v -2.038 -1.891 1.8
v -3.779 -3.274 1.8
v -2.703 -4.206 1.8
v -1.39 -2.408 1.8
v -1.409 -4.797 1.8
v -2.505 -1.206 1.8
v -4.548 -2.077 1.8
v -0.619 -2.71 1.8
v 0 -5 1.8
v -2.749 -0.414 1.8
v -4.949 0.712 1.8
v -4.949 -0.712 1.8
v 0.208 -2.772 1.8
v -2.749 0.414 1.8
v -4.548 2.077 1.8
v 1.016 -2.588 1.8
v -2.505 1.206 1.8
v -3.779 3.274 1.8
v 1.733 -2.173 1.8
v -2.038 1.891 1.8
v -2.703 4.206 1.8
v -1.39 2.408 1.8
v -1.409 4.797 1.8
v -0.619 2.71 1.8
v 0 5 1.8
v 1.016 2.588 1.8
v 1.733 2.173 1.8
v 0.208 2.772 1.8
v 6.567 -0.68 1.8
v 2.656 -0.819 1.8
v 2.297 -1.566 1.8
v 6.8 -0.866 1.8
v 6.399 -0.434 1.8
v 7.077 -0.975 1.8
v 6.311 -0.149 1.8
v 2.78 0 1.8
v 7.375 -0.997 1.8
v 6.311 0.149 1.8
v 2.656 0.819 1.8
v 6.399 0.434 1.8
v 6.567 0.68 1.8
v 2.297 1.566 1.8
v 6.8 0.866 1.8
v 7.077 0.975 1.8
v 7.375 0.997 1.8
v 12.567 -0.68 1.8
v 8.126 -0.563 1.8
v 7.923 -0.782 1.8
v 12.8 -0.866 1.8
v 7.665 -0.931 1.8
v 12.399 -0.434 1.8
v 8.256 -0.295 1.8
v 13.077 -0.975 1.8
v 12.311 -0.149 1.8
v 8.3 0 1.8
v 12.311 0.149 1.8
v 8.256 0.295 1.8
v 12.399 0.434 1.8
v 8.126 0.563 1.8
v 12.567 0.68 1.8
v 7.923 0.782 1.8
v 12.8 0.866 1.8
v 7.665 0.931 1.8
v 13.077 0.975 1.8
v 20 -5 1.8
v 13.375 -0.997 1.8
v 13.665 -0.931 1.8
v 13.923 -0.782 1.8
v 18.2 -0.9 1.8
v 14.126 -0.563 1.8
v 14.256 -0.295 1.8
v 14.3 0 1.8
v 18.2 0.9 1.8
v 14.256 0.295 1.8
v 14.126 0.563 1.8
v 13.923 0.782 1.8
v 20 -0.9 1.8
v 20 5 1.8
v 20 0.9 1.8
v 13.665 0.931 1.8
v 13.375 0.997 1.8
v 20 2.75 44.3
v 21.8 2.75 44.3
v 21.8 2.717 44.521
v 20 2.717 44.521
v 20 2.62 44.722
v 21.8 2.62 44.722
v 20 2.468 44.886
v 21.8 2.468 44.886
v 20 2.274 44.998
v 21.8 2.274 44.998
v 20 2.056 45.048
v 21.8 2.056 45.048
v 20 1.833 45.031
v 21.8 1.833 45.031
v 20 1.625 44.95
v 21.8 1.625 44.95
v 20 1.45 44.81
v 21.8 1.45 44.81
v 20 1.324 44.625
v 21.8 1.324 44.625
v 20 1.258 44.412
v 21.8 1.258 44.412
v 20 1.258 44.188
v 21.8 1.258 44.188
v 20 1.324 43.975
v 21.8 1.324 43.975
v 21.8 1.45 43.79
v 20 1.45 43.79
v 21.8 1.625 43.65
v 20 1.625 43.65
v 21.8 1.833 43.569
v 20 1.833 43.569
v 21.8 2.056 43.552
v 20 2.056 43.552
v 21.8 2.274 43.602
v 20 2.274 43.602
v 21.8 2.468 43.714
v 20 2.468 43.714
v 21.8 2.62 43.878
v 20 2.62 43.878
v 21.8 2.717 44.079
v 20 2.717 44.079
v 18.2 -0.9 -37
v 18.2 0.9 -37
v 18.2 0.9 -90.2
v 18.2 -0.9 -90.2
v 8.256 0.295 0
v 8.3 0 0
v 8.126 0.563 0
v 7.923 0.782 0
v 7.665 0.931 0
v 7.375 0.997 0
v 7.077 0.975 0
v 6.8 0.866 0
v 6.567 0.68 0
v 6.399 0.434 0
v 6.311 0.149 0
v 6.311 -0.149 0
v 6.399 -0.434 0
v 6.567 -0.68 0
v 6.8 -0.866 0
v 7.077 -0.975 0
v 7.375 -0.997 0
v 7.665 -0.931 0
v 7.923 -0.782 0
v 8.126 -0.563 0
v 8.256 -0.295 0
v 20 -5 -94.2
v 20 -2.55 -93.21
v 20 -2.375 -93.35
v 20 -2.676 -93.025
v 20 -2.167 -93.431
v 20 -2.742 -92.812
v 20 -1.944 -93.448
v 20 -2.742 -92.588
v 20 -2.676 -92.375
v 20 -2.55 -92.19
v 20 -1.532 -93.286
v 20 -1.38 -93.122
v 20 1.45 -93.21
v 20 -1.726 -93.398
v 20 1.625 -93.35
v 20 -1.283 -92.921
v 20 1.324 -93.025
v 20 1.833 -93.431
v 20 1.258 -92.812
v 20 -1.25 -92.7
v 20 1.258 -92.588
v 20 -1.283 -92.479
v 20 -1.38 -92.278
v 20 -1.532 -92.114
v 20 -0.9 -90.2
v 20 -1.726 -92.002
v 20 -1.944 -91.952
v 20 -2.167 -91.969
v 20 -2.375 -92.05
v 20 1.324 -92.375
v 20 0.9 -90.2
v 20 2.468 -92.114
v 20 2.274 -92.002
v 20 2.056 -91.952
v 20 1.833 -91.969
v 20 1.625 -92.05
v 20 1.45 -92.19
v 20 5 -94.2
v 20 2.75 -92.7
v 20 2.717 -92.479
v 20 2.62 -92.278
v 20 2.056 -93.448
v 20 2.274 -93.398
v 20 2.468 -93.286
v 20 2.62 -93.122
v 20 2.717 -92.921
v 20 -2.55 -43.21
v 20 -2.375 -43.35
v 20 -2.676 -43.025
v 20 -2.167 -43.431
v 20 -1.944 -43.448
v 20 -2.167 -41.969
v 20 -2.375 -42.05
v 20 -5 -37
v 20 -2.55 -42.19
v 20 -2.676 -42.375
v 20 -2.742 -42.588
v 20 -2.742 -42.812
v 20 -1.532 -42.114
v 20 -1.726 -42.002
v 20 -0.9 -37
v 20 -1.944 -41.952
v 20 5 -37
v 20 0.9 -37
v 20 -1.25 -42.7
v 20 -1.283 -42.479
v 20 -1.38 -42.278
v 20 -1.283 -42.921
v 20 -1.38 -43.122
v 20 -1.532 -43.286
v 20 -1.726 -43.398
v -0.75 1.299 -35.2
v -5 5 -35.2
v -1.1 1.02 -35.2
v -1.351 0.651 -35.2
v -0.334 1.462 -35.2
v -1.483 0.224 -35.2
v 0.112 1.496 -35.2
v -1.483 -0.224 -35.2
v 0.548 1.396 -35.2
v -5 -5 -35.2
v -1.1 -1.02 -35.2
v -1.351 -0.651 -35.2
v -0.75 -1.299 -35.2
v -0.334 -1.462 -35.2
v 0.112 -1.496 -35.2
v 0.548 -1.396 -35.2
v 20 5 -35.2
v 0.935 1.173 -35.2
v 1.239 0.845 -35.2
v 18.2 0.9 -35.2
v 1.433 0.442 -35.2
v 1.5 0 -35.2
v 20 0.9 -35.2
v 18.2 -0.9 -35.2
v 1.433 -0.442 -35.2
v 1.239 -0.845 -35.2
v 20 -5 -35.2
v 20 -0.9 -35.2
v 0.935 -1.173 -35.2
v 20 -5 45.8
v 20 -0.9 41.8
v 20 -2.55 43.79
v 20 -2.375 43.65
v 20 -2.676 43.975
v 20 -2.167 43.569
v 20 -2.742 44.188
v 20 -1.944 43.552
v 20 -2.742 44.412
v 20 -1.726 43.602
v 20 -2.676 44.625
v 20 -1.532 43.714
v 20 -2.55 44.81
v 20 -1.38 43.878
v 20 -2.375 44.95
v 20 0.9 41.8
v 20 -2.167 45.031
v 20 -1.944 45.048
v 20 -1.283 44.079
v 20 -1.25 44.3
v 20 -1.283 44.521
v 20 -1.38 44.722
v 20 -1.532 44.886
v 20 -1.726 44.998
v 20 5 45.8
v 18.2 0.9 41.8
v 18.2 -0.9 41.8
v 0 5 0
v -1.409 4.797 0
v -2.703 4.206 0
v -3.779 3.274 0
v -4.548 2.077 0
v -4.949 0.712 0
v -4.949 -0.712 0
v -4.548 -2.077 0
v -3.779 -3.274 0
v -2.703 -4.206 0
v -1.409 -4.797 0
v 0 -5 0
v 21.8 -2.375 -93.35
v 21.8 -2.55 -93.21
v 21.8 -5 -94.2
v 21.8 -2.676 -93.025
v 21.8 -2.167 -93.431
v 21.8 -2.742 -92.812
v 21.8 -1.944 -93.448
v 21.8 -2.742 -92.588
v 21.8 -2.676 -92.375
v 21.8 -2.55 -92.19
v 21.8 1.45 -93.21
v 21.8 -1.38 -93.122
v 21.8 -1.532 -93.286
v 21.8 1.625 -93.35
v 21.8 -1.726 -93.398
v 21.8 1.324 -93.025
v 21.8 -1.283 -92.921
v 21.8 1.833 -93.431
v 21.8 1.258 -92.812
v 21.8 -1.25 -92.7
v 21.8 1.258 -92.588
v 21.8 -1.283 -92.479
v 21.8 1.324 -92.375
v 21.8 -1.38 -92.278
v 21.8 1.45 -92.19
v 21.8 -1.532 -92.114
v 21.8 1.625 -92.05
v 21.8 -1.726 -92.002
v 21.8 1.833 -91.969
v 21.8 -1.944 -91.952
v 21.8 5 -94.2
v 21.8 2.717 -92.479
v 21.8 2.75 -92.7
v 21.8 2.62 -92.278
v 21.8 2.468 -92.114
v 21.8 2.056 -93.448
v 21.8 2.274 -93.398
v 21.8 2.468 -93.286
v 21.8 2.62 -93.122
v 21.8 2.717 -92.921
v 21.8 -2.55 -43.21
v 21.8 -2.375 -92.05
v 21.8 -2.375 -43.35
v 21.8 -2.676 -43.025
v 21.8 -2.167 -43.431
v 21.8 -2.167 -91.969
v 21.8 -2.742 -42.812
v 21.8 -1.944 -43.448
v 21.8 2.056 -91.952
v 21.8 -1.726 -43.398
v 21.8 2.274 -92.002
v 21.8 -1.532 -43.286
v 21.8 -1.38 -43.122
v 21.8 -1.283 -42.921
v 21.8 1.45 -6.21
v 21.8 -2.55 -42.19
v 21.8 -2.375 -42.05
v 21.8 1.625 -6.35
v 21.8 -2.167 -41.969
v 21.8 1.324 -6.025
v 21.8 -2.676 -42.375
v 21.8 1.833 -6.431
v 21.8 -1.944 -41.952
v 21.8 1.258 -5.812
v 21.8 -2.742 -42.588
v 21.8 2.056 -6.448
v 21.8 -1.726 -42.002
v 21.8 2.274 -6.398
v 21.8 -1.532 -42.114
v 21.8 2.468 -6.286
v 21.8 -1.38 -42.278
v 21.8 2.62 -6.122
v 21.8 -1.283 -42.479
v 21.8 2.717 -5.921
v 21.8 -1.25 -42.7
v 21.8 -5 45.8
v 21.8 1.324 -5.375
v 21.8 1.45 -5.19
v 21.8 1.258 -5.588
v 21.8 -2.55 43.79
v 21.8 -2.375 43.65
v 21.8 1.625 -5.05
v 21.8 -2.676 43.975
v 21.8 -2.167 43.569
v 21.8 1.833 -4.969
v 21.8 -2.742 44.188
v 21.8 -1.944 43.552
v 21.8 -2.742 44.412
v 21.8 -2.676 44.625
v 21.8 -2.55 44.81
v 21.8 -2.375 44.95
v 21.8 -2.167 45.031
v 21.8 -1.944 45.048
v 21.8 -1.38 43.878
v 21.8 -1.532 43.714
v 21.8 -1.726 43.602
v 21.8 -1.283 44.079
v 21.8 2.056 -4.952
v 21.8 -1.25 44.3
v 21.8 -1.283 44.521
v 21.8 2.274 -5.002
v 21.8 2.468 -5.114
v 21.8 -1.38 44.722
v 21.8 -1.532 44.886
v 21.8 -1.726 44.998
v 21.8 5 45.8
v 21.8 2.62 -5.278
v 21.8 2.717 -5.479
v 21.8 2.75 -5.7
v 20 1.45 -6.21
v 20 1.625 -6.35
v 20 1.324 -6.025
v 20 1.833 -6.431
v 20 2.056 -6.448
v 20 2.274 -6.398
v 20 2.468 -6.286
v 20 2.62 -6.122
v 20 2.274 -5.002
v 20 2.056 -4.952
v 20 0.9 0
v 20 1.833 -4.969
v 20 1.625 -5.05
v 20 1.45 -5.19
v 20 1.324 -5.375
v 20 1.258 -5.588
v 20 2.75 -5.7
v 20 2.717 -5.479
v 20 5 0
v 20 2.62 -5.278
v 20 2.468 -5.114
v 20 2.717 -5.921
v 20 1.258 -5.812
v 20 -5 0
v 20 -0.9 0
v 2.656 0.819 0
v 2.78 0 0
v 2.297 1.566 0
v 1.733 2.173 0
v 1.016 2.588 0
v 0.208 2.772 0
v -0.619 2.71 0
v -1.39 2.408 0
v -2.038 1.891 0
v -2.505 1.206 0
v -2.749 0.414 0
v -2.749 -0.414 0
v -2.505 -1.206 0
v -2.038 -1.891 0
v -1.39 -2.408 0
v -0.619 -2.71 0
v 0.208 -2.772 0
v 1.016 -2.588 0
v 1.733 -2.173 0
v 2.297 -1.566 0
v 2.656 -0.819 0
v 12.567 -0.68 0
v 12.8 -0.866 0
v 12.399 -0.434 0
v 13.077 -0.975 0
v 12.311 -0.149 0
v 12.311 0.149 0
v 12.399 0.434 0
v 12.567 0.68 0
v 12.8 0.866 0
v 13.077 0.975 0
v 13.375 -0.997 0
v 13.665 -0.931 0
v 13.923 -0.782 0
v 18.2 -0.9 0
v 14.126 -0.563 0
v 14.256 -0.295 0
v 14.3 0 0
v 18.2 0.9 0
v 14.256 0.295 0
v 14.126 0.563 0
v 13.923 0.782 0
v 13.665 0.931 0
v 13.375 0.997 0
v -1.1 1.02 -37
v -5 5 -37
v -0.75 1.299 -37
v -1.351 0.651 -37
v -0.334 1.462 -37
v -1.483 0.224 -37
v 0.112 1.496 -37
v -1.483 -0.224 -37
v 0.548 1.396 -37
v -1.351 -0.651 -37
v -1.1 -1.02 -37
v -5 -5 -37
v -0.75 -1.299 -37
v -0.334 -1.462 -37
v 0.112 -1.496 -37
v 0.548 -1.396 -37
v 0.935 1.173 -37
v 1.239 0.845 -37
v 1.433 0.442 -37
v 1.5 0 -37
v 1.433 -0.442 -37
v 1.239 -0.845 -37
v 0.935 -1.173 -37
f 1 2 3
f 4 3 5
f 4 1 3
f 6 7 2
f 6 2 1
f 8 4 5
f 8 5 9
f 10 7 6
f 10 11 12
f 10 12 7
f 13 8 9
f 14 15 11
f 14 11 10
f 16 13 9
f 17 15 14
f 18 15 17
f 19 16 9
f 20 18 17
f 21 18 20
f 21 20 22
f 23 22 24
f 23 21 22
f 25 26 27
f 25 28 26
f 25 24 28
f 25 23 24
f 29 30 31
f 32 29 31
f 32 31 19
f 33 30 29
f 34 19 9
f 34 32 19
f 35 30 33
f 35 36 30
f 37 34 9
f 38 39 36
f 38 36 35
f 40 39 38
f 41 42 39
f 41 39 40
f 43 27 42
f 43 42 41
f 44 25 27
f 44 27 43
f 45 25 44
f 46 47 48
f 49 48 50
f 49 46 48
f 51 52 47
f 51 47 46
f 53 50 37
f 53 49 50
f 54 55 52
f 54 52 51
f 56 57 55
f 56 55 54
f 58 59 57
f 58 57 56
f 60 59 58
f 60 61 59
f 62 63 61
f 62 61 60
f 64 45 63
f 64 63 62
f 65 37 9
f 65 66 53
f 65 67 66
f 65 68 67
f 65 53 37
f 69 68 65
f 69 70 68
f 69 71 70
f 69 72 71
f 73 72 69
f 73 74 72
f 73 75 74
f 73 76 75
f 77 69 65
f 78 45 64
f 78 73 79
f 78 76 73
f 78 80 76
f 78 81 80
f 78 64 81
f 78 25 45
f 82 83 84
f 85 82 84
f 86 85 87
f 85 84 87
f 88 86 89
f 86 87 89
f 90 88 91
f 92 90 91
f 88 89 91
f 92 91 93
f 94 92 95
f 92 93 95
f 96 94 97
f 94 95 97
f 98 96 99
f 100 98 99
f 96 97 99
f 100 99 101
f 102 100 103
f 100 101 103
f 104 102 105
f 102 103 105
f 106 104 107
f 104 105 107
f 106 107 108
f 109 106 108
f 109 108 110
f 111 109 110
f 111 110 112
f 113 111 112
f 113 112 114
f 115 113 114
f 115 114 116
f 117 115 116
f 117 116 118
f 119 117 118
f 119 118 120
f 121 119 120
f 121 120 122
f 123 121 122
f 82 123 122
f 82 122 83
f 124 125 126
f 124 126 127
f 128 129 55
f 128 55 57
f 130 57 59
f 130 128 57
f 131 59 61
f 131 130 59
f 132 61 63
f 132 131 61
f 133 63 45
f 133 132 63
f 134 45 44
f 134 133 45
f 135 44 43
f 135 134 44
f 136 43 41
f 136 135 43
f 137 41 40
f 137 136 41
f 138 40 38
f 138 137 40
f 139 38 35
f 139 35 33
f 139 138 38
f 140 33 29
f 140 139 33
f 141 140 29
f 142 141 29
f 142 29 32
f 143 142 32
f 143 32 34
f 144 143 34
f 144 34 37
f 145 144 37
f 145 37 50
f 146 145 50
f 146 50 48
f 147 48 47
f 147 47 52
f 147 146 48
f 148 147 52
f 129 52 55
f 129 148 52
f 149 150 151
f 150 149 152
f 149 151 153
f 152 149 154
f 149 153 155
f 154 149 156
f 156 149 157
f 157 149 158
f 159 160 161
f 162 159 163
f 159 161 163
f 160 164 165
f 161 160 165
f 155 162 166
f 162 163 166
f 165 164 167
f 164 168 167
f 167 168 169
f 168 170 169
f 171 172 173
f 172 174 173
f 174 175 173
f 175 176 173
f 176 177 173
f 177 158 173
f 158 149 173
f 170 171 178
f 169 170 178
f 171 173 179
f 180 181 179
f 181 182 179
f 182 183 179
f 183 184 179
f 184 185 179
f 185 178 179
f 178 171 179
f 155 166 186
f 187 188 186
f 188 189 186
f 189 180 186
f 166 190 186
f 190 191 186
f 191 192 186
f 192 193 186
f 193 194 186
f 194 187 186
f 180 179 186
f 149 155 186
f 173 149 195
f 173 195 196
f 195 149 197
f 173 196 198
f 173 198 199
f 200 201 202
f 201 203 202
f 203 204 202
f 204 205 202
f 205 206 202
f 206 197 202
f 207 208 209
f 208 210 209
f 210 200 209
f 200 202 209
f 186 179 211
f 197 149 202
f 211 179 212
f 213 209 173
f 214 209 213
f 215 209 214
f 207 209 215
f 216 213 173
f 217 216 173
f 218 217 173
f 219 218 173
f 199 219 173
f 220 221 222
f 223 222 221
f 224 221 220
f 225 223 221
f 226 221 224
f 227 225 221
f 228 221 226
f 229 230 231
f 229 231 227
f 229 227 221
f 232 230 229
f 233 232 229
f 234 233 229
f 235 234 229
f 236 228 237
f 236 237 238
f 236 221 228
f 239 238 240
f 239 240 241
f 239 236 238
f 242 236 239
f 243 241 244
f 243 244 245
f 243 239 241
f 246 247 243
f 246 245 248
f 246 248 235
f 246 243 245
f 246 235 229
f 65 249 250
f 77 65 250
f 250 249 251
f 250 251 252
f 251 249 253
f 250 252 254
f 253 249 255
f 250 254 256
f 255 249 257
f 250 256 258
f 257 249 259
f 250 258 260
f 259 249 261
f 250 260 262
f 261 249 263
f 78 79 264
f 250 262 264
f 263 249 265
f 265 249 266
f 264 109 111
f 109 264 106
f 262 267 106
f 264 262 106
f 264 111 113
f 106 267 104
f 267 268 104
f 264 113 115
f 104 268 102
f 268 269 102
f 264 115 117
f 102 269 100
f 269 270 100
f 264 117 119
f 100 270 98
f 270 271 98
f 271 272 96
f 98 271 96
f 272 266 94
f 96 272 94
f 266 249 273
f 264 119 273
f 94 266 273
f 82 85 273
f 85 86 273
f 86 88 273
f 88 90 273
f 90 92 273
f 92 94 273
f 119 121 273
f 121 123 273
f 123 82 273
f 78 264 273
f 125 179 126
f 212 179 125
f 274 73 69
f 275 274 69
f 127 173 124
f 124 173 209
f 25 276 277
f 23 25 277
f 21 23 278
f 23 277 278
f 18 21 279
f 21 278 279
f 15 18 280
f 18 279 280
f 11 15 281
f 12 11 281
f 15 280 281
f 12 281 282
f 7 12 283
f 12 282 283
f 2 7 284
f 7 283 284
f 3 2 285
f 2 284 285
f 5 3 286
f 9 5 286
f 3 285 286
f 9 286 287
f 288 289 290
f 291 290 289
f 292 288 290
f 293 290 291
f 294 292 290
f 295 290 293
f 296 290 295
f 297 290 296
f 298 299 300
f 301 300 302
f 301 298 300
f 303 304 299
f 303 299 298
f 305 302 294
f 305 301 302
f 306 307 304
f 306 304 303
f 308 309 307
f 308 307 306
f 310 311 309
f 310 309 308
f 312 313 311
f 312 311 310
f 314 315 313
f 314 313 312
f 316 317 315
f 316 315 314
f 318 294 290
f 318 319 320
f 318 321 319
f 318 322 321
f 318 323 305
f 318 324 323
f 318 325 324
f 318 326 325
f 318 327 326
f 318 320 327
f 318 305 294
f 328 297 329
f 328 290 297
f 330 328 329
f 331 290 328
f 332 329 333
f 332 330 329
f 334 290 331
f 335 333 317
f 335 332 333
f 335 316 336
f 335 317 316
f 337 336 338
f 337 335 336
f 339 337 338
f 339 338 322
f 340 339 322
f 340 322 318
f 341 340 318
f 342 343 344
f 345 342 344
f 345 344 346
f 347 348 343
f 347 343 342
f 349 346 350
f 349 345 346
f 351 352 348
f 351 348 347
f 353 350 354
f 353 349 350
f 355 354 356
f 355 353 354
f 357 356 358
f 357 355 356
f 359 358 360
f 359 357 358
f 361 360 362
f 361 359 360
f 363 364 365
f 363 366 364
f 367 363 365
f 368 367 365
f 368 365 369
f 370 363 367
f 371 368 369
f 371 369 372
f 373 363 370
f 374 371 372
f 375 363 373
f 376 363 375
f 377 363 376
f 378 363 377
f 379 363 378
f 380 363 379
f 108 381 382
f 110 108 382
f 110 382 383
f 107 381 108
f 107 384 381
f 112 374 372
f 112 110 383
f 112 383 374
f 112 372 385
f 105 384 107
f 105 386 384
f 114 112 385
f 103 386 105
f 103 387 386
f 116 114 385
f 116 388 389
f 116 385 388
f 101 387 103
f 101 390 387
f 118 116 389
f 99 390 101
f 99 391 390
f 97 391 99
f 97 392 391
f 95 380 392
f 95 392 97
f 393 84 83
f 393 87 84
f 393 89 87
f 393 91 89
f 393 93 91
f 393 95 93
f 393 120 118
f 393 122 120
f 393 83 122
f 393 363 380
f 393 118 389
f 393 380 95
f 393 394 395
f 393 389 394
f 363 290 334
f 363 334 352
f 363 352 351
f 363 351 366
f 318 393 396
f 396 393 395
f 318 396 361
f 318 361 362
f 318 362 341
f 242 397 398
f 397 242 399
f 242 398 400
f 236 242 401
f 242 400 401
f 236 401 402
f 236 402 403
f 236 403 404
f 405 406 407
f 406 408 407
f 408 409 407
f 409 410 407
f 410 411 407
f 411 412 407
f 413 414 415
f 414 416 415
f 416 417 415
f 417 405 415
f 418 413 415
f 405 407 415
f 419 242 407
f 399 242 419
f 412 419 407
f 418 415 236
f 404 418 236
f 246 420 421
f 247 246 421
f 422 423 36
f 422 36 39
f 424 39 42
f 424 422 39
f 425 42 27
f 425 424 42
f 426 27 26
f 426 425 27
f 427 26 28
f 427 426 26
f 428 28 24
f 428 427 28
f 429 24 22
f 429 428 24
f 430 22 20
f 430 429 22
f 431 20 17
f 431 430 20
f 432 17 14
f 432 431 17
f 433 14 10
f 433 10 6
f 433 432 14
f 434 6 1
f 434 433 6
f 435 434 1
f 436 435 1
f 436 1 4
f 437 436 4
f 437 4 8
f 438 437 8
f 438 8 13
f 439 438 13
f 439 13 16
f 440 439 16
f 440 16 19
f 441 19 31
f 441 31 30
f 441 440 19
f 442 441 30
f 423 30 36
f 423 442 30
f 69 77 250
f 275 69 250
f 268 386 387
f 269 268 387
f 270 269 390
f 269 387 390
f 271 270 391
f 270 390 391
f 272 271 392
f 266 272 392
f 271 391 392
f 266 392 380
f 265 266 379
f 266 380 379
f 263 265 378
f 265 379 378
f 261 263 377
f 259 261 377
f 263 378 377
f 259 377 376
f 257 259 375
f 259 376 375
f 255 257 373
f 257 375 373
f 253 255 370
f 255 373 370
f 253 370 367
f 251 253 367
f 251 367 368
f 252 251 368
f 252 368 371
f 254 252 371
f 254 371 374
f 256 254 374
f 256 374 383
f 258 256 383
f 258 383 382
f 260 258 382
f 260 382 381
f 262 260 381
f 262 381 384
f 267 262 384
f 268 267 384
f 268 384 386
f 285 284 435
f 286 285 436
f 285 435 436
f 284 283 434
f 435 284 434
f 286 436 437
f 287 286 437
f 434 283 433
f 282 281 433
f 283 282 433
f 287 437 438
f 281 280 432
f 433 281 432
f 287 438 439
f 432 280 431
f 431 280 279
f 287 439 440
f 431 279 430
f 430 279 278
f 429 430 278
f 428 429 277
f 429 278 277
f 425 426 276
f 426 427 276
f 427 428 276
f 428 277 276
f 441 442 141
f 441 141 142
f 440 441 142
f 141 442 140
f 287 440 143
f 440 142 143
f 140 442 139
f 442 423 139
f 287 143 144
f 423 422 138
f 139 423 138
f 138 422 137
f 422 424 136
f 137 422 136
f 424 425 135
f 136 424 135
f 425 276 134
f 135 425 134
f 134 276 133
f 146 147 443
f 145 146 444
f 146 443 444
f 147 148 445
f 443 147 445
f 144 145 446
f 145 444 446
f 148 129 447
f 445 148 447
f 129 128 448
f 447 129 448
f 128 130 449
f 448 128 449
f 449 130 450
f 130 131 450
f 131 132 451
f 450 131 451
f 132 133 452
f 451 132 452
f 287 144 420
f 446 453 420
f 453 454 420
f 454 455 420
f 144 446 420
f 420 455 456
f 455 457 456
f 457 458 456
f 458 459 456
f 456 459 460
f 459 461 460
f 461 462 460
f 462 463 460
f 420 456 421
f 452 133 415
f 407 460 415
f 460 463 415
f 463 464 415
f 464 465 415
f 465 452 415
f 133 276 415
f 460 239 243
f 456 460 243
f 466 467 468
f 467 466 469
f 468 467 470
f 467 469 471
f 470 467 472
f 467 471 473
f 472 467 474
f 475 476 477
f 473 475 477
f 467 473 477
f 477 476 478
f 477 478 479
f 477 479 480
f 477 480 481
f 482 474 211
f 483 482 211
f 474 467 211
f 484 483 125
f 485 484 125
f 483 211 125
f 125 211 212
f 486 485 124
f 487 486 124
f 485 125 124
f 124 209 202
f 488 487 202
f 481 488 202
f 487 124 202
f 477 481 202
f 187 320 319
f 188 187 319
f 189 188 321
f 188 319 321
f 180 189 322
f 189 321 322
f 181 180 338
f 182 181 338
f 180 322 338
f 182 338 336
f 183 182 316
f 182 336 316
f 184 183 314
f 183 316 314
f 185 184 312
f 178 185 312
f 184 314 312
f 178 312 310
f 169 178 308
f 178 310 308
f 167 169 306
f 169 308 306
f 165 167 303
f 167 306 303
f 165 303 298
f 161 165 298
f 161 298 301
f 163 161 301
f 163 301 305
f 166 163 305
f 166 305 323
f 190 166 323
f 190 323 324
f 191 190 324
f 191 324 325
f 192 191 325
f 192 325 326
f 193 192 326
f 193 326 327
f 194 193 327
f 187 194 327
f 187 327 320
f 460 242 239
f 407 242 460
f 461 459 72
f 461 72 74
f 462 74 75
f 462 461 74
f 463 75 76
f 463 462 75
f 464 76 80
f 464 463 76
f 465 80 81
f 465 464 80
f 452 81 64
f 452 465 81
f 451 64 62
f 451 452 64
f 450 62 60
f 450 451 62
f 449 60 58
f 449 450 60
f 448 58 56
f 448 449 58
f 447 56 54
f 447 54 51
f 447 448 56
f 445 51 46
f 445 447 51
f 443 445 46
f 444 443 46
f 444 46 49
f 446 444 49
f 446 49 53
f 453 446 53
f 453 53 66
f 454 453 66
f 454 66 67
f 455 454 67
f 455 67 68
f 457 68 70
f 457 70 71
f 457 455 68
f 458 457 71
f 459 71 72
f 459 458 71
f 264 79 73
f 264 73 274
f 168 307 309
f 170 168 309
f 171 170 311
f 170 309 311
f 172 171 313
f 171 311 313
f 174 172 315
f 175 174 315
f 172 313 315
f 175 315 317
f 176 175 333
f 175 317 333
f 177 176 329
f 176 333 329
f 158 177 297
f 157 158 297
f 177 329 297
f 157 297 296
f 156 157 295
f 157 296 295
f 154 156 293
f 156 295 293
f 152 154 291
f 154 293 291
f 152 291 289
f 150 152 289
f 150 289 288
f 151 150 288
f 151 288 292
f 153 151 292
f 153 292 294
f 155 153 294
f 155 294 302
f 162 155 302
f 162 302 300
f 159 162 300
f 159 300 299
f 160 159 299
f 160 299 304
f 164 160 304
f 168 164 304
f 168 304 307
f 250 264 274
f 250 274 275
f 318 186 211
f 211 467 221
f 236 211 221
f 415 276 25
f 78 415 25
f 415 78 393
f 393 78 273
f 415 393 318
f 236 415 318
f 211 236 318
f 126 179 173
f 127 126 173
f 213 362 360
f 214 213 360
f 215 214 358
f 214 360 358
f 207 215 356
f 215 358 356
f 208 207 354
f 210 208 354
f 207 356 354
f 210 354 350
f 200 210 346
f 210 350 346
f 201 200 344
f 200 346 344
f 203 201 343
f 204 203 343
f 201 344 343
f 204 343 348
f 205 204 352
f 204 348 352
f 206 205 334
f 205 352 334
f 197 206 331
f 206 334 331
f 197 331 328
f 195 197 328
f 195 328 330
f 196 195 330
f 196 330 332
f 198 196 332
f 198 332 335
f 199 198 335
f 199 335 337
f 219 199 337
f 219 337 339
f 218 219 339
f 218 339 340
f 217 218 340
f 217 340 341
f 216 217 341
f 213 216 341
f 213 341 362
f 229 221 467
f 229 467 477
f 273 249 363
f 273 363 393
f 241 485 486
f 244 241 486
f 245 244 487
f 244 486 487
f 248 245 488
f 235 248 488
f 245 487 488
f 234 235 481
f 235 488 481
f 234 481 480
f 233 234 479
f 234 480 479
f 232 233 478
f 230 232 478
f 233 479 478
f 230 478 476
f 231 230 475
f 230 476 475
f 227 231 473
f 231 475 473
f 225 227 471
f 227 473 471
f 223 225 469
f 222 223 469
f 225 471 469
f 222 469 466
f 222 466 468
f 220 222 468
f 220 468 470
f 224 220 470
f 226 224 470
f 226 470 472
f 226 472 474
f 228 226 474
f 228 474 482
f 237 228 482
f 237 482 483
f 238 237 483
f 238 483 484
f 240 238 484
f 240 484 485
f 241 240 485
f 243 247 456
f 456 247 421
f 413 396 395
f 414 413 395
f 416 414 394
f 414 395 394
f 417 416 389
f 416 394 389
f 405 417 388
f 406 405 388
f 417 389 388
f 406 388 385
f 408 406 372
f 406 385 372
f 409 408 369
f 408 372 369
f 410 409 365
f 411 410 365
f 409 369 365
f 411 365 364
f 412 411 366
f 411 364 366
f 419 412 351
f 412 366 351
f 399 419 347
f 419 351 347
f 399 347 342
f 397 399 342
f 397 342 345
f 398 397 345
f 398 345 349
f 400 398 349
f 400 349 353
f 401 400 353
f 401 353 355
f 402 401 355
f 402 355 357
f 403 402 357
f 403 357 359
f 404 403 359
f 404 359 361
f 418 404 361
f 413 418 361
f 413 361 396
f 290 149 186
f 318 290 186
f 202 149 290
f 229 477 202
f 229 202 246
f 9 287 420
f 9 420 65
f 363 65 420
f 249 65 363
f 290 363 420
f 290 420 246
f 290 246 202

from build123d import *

# Parameters (mm, degrees)
SKETCH_R        = 2.78
SKETCH_R_2      = 1
PAD_DEPTH       = 1.8
SKETCH001_W     = 10
SKETCH001_H     = 140
PAD001_DEPTH    = 1.8
SKETCH002_W     = 10
SKETCH002_H     = 1.8
PAD002_DEPTH    = 25
SKETCH003_R     = 1.5
POCKET_DEPTH    = 82.801
SKETCH004_R     = 0.75
POCKET001_DEPTH = 26.801
SKETCH005_W     = 1.8
SKETCH005_H     = 53.2
SKETCH005_H_2   = 35.2
SKETCH005_H_3   = 40
PAD003_DEPTH    = 1.8


with BuildPart() as part:
    # Sketch → Pad (new body)
    with BuildSketch(Plane.XY):
        with BuildLine():
            ThreePointArc((0, 5), (-5, 0), (0, -5))
            Line((0, -5), (20, -5))
            Line((20, 5), (20, -5))
            Line((0, 5), (20, 5))
        make_face()
        Circle(SKETCH_R, mode=Mode.SUBTRACT)
        with Locations((7.3, 0)):
            Circle(SKETCH_R_2, mode=Mode.SUBTRACT)
        with Locations((13.3, 0)):
            Circle(SKETCH_R_2, mode=Mode.SUBTRACT)
    extrude(amount=PAD_DEPTH)

    # Sketch001 → Pad001 (new body)
    with BuildSketch(Plane.YZ.offset(20)):
        with Locations((0, -24.2)):
            Rectangle(SKETCH001_W, SKETCH001_H)
    extrude(amount=PAD001_DEPTH)

    # Sketch002 → Pad002 (new body)
    with BuildSketch(Plane(origin=(20, 0, 0), x_dir=(0, -1, 0), z_dir=(-1, 0, 0))):
        with Locations((0, -36.1)):
            Rectangle(SKETCH002_W, SKETCH002_H)
    extrude(amount=PAD002_DEPTH)

    # Sketch003 → Pocket (cut, through all)
    with BuildSketch(Plane(origin=(0, 0, -37), x_dir=(1, 0, 0), z_dir=(0, 0, -1))):
        Circle(SKETCH003_R)
    extrude(amount=-POCKET_DEPTH, mode=Mode.SUBTRACT)

    # Sketch004 → Pocket001 (cut, through all)
    with BuildSketch(Plane.YZ.offset(21.8)):
        with Locations((-2, -92.7)):
            Circle(SKETCH004_R)
        with Locations((2, -92.7)):
            Circle(SKETCH004_R)
        with Locations((-2, -42.7)):
            Circle(SKETCH004_R)
        with Locations((2, -5.7)):
            Circle(SKETCH004_R)
        with Locations((2, 44.3)):
            Circle(SKETCH004_R)
        with Locations((-2, 44.3)):
            Circle(SKETCH004_R)
    extrude(amount=-POCKET001_DEPTH, mode=Mode.SUBTRACT)

    # Sketch005 → Pad003 (new body)
    with BuildSketch(Plane(origin=(20, 0, 0), x_dir=(0, -1, 0), z_dir=(-1, 0, 0))):
        with Locations((0, -63.6)):
            Rectangle(SKETCH005_W, SKETCH005_H)
        with Locations((0, -17.6)):
            Rectangle(SKETCH005_W, SKETCH005_H_2)
        with Locations((0, 21.8)):
            Rectangle(SKETCH005_W, SKETCH005_H_3)
    extrude(amount=PAD003_DEPTH)


solid = part.part
